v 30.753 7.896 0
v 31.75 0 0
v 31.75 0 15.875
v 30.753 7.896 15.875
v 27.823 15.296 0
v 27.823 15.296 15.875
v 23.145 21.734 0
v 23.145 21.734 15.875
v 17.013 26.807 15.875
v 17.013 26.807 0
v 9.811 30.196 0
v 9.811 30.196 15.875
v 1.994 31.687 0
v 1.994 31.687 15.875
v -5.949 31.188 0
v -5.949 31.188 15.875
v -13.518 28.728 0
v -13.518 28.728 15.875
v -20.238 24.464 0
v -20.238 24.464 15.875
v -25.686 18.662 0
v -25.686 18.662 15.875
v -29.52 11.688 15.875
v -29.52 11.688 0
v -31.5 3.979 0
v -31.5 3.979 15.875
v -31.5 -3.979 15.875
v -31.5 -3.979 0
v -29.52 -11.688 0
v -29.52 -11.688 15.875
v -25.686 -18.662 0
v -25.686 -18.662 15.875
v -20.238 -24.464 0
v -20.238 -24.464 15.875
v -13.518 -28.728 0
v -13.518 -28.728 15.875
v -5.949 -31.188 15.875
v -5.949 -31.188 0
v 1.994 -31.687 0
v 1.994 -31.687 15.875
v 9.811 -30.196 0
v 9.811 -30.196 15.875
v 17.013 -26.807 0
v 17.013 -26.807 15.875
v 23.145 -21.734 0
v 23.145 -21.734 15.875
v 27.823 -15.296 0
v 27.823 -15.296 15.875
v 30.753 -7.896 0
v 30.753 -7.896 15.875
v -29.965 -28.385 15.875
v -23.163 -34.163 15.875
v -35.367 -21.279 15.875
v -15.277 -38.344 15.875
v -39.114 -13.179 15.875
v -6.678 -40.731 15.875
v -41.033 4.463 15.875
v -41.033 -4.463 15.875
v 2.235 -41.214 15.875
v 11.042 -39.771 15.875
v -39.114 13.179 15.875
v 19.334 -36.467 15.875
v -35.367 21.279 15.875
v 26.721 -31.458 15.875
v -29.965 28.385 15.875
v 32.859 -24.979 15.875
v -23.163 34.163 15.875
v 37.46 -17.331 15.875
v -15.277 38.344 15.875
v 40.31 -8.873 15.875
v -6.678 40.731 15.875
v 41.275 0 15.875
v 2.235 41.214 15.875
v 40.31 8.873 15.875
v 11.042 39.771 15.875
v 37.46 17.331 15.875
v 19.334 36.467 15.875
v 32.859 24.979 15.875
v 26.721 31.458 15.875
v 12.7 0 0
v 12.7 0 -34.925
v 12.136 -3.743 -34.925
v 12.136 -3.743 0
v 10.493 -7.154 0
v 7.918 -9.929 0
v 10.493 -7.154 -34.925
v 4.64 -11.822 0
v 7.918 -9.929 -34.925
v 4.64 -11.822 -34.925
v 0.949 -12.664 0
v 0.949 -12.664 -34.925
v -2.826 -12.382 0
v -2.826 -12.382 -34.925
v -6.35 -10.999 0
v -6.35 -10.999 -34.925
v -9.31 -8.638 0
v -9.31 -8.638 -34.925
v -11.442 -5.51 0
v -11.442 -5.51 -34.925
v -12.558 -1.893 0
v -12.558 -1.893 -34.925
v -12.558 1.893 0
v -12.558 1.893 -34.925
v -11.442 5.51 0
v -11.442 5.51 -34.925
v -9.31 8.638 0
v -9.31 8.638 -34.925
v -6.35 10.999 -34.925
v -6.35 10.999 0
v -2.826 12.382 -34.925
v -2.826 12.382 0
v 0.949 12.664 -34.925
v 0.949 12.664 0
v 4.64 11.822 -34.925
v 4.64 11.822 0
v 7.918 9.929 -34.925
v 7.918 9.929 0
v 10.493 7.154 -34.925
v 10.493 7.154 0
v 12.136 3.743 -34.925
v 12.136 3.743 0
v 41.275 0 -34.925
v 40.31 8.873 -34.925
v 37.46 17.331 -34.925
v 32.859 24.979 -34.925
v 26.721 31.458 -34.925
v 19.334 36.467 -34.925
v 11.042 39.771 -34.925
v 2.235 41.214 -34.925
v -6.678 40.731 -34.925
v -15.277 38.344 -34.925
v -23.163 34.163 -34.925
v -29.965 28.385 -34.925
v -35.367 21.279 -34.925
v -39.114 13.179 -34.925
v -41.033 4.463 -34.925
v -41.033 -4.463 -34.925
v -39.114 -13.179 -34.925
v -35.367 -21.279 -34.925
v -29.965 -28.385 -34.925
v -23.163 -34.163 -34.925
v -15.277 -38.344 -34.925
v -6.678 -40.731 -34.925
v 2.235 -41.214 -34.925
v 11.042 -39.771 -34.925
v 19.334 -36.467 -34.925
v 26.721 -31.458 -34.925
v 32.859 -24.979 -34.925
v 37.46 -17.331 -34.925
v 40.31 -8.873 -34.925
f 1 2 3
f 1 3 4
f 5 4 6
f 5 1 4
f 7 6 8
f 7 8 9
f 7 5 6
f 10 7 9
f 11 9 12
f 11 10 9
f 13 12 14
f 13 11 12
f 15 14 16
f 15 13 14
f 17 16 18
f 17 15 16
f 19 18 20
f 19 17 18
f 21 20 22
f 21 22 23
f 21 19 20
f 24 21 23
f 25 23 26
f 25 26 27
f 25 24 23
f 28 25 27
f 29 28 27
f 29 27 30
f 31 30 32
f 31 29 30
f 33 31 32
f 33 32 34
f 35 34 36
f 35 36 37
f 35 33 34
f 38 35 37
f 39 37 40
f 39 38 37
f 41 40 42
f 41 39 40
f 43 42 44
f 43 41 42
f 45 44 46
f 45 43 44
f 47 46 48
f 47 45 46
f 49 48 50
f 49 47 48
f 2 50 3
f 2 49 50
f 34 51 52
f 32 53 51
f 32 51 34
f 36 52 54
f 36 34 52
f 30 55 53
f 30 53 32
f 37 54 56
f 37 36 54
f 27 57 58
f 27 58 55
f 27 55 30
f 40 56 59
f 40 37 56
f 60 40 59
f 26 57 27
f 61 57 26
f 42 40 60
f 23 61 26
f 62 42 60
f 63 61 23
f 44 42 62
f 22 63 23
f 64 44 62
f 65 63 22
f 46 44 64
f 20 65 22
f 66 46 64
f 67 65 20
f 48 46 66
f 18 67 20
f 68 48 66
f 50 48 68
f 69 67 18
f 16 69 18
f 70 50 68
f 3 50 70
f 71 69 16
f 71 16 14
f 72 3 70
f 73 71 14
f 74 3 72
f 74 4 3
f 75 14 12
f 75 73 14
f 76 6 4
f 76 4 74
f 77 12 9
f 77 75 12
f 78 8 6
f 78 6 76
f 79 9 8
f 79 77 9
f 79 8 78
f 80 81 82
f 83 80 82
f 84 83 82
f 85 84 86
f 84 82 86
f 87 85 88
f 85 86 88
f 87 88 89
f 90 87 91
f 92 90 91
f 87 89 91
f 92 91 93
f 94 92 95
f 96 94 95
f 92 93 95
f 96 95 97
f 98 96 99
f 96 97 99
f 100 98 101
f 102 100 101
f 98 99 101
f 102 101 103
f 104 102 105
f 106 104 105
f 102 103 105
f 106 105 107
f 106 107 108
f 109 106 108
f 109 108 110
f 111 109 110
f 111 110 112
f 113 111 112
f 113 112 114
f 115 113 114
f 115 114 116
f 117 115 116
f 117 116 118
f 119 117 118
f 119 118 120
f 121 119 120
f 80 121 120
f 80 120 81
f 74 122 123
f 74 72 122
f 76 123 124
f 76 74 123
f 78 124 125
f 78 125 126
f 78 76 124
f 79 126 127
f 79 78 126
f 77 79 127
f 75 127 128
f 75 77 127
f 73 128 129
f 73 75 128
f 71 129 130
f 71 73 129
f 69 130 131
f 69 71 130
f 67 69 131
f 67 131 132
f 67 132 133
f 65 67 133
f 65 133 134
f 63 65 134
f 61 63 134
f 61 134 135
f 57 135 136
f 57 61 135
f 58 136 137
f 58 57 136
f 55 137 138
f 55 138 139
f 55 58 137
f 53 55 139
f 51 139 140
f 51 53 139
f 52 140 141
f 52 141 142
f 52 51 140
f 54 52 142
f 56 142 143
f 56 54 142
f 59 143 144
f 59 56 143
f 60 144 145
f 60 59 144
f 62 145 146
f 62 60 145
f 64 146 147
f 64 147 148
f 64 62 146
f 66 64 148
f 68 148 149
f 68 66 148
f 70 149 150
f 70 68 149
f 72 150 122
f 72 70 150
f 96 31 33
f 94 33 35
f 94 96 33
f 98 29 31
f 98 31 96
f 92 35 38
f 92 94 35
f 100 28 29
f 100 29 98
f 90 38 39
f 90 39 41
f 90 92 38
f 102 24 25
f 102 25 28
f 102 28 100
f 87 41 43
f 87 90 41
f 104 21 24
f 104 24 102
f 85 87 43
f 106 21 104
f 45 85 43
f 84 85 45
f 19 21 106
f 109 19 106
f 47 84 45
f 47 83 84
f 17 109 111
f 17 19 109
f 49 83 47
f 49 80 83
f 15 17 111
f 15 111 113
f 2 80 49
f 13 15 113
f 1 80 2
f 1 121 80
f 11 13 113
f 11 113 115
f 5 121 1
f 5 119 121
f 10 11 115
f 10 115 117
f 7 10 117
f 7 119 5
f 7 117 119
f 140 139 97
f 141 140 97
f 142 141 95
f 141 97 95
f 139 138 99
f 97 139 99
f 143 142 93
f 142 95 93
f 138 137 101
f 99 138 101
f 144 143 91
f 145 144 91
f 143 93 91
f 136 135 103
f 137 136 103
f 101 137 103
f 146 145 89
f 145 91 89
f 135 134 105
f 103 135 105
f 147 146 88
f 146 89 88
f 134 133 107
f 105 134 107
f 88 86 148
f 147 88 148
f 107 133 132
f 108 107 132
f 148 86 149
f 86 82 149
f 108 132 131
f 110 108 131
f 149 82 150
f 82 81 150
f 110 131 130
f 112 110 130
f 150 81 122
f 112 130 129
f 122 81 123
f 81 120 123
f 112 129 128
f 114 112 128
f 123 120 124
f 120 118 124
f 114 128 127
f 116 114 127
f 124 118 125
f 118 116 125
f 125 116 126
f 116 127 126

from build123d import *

# Parameters (mm, degrees)
F0_R     = 41.275
F0_R_2   = 31.75
F1_DEPTH = 15.875
F2_R     = 41.275
F3_DEPTH = 34.925
F4_R     = 12.7
F5_DEPTH = 50.8


with BuildPart() as f1:
    # F0 (on Top) → F1 (new body)
    with BuildSketch(Plane.XY):
        Circle(F0_R)
        Circle(F0_R_2, mode=Mode.SUBTRACT)
    extrude(amount=F1_DEPTH)

    # F2 (on face) → F3 (join)
    with BuildSketch(Plane.XY):
        Circle(F2_R)
    extrude(amount=-F3_DEPTH)

    # F4 (on face) → F5 (cut)
    with BuildSketch(Plane(origin=(0, 0, -34.925), x_dir=(1, 0, 0), z_dir=(0, 0, -1))):
        Circle(F4_R)
    extrude(amount=-F5_DEPTH, mode=Mode.SUBTRACT)


solid = f1.part
